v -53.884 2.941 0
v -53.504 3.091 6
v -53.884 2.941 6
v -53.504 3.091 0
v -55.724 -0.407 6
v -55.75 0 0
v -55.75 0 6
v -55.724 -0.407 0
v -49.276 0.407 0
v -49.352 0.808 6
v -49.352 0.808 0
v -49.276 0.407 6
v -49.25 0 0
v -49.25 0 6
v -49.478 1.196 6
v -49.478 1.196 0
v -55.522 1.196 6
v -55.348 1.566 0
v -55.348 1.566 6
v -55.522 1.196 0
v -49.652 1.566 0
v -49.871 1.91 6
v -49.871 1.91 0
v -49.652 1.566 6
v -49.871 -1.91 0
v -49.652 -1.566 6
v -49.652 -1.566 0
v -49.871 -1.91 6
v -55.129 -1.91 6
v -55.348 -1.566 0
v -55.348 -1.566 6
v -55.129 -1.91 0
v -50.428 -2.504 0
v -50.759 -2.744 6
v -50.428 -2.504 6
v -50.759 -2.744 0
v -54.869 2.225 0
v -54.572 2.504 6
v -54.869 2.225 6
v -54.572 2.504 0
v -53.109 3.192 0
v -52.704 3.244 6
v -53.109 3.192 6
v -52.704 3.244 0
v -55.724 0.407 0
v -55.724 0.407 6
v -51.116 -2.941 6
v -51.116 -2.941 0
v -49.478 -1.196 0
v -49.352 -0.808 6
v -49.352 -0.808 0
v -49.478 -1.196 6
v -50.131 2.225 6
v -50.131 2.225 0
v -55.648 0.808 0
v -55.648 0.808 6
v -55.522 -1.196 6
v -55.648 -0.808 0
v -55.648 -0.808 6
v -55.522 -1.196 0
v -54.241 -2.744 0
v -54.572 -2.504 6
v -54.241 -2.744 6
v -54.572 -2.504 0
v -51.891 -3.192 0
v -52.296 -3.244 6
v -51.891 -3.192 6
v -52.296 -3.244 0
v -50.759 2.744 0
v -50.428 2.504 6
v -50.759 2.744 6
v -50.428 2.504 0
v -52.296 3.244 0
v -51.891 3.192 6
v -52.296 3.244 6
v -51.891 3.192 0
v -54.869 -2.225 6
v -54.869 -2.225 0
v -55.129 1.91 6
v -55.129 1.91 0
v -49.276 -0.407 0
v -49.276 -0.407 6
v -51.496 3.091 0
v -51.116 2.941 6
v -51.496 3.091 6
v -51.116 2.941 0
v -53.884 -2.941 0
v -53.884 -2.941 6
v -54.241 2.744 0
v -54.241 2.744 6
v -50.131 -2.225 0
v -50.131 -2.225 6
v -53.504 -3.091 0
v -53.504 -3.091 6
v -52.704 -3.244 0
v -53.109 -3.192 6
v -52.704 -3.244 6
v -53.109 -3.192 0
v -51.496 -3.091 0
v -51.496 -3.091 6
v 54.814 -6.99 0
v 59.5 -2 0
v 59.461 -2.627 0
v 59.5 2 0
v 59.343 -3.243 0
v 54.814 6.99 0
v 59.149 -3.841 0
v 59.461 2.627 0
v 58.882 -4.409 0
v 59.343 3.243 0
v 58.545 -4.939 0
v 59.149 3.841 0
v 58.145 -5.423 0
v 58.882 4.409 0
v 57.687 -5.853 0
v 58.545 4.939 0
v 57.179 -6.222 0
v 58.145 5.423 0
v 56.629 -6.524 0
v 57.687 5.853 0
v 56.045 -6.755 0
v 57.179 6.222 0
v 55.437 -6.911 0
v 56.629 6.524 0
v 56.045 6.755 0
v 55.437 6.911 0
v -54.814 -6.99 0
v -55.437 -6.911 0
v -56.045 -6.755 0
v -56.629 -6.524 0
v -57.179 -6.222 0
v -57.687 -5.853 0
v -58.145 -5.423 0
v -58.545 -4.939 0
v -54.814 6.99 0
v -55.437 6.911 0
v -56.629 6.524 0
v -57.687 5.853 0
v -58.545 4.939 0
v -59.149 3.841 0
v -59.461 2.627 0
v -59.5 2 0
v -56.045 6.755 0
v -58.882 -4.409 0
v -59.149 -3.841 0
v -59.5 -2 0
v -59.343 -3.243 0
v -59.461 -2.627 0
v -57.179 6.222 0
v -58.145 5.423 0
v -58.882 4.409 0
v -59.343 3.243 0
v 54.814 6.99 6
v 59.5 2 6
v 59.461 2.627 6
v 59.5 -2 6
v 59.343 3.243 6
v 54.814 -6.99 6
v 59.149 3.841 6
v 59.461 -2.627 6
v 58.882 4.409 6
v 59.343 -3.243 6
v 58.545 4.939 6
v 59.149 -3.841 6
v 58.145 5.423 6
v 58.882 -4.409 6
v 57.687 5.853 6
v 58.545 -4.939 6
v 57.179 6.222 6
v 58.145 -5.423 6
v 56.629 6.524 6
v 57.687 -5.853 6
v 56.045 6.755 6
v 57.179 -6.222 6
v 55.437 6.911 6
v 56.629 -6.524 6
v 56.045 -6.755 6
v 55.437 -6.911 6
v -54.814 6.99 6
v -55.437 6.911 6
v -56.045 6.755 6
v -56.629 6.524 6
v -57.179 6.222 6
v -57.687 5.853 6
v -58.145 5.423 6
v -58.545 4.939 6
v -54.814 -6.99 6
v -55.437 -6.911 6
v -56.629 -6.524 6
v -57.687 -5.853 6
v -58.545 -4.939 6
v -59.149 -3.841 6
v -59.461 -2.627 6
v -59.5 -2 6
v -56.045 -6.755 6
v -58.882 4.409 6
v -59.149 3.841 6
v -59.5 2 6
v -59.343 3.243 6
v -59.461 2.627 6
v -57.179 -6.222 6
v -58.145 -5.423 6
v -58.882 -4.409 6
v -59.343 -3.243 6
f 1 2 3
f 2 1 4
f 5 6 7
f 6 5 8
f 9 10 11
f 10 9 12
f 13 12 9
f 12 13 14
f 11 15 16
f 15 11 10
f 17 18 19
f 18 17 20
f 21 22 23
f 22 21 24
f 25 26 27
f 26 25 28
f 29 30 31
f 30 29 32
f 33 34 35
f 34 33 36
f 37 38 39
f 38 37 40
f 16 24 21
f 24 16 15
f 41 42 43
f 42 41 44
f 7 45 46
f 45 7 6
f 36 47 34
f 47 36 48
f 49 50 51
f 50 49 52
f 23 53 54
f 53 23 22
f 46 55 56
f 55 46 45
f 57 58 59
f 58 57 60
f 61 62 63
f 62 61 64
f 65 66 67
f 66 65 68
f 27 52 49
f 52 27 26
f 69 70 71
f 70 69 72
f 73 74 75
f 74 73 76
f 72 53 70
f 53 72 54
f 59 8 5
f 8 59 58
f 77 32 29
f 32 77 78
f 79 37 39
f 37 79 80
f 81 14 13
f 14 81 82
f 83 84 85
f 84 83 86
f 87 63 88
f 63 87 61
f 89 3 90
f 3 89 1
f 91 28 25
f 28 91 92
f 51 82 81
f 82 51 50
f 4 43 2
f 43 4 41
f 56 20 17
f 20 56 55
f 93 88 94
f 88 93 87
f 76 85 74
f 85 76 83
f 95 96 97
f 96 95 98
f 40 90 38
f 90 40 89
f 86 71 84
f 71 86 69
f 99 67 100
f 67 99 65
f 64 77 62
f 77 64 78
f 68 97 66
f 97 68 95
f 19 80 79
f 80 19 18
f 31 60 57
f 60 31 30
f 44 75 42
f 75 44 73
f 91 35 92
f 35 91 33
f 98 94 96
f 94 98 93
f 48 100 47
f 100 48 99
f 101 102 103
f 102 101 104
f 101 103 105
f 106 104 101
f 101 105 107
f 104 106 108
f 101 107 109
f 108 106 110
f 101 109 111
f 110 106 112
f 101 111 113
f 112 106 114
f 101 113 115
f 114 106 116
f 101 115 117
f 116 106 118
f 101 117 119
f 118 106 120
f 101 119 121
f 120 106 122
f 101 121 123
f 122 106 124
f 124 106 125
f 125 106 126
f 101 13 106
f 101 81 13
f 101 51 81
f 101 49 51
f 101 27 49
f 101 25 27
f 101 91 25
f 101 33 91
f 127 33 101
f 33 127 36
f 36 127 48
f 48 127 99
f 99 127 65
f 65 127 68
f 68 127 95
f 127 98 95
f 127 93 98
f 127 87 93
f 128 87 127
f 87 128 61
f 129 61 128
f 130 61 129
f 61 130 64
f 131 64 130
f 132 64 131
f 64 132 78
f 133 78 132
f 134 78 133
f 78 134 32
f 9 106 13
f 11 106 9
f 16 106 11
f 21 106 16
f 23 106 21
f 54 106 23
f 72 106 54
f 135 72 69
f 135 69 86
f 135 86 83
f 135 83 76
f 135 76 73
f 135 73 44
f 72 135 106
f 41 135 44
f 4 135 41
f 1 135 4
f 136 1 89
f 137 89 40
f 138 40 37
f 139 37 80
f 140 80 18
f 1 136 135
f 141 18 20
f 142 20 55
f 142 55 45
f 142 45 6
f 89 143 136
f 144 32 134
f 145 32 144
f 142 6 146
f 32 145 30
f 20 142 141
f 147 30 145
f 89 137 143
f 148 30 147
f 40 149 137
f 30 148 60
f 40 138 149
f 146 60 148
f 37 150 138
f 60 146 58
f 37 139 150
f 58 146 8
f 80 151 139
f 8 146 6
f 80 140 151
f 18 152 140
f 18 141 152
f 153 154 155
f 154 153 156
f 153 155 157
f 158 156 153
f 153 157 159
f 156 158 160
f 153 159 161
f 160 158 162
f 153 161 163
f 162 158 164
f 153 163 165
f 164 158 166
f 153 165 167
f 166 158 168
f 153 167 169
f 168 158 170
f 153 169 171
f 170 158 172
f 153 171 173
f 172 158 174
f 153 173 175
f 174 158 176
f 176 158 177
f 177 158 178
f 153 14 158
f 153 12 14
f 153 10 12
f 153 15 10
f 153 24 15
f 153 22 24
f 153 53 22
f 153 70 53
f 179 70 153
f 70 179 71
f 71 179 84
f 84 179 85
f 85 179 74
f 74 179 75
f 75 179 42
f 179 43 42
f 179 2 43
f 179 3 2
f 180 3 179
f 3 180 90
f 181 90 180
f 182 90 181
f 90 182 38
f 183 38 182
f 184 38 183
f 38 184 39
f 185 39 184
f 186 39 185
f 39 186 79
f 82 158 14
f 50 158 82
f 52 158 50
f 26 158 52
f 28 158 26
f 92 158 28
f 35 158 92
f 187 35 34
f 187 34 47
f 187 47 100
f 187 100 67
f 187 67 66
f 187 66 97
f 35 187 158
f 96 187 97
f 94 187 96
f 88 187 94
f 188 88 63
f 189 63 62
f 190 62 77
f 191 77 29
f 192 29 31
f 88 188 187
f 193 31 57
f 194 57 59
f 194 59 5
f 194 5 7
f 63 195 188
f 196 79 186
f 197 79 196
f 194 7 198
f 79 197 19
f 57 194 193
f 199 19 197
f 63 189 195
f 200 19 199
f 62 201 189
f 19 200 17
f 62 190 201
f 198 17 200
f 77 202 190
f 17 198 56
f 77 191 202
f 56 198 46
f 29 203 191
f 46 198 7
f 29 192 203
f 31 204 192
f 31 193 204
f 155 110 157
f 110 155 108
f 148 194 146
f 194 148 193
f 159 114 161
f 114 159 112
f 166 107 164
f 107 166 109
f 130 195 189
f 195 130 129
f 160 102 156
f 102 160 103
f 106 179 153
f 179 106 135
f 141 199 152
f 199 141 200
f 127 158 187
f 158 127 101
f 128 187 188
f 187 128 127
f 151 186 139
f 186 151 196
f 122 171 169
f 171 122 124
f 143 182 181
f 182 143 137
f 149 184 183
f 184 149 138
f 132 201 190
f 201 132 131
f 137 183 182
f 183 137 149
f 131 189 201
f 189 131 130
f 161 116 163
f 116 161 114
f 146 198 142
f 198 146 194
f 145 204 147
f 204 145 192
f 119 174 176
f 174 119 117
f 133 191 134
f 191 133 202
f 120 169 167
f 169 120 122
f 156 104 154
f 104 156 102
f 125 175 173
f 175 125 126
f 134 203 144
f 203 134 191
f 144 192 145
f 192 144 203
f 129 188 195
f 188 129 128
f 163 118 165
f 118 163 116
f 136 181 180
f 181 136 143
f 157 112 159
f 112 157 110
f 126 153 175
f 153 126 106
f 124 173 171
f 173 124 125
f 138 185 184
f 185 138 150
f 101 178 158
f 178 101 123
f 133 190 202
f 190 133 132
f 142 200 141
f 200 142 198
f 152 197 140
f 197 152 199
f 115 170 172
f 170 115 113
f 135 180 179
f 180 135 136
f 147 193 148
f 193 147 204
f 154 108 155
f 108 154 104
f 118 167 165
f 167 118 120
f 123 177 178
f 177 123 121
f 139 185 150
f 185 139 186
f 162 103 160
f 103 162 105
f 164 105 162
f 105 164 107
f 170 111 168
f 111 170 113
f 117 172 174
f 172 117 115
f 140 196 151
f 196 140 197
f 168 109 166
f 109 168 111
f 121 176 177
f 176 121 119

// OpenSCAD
$fn = 50;


difference() {
	union() {
		hull() {
			translate(v = [-54.5000000000, 2.0000000000, 0]) {
				cylinder(h = 6, r = 5);
			}
			translate(v = [54.5000000000, 2.0000000000, 0]) {
				cylinder(h = 6, r = 5);
			}
			translate(v = [-54.5000000000, -2.0000000000, 0]) {
				cylinder(h = 6, r = 5);
			}
			translate(v = [54.5000000000, -2.0000000000, 0]) {
				cylinder(h = 6, r = 5);
			}
		}
	}
	union() {
		translate(v = [-52.5000000000, 0.0000000000, 0]) {
			cylinder(h = 6, r = 3.2500000000);
		}
		translate(v = [-52.5000000000, 0.0000000000, 0]) {
			cylinder(h = 6, r = 1.8000000000);
		}
		translate(v = [-52.5000000000, 0.0000000000, 0]) {
			cylinder(h = 6, r = 1.8000000000);
		}
		translate(v = [-52.5000000000, 0.0000000000, 0]) {
			cylinder(h = 6, r = 1.8000000000);
		}
	}
}
